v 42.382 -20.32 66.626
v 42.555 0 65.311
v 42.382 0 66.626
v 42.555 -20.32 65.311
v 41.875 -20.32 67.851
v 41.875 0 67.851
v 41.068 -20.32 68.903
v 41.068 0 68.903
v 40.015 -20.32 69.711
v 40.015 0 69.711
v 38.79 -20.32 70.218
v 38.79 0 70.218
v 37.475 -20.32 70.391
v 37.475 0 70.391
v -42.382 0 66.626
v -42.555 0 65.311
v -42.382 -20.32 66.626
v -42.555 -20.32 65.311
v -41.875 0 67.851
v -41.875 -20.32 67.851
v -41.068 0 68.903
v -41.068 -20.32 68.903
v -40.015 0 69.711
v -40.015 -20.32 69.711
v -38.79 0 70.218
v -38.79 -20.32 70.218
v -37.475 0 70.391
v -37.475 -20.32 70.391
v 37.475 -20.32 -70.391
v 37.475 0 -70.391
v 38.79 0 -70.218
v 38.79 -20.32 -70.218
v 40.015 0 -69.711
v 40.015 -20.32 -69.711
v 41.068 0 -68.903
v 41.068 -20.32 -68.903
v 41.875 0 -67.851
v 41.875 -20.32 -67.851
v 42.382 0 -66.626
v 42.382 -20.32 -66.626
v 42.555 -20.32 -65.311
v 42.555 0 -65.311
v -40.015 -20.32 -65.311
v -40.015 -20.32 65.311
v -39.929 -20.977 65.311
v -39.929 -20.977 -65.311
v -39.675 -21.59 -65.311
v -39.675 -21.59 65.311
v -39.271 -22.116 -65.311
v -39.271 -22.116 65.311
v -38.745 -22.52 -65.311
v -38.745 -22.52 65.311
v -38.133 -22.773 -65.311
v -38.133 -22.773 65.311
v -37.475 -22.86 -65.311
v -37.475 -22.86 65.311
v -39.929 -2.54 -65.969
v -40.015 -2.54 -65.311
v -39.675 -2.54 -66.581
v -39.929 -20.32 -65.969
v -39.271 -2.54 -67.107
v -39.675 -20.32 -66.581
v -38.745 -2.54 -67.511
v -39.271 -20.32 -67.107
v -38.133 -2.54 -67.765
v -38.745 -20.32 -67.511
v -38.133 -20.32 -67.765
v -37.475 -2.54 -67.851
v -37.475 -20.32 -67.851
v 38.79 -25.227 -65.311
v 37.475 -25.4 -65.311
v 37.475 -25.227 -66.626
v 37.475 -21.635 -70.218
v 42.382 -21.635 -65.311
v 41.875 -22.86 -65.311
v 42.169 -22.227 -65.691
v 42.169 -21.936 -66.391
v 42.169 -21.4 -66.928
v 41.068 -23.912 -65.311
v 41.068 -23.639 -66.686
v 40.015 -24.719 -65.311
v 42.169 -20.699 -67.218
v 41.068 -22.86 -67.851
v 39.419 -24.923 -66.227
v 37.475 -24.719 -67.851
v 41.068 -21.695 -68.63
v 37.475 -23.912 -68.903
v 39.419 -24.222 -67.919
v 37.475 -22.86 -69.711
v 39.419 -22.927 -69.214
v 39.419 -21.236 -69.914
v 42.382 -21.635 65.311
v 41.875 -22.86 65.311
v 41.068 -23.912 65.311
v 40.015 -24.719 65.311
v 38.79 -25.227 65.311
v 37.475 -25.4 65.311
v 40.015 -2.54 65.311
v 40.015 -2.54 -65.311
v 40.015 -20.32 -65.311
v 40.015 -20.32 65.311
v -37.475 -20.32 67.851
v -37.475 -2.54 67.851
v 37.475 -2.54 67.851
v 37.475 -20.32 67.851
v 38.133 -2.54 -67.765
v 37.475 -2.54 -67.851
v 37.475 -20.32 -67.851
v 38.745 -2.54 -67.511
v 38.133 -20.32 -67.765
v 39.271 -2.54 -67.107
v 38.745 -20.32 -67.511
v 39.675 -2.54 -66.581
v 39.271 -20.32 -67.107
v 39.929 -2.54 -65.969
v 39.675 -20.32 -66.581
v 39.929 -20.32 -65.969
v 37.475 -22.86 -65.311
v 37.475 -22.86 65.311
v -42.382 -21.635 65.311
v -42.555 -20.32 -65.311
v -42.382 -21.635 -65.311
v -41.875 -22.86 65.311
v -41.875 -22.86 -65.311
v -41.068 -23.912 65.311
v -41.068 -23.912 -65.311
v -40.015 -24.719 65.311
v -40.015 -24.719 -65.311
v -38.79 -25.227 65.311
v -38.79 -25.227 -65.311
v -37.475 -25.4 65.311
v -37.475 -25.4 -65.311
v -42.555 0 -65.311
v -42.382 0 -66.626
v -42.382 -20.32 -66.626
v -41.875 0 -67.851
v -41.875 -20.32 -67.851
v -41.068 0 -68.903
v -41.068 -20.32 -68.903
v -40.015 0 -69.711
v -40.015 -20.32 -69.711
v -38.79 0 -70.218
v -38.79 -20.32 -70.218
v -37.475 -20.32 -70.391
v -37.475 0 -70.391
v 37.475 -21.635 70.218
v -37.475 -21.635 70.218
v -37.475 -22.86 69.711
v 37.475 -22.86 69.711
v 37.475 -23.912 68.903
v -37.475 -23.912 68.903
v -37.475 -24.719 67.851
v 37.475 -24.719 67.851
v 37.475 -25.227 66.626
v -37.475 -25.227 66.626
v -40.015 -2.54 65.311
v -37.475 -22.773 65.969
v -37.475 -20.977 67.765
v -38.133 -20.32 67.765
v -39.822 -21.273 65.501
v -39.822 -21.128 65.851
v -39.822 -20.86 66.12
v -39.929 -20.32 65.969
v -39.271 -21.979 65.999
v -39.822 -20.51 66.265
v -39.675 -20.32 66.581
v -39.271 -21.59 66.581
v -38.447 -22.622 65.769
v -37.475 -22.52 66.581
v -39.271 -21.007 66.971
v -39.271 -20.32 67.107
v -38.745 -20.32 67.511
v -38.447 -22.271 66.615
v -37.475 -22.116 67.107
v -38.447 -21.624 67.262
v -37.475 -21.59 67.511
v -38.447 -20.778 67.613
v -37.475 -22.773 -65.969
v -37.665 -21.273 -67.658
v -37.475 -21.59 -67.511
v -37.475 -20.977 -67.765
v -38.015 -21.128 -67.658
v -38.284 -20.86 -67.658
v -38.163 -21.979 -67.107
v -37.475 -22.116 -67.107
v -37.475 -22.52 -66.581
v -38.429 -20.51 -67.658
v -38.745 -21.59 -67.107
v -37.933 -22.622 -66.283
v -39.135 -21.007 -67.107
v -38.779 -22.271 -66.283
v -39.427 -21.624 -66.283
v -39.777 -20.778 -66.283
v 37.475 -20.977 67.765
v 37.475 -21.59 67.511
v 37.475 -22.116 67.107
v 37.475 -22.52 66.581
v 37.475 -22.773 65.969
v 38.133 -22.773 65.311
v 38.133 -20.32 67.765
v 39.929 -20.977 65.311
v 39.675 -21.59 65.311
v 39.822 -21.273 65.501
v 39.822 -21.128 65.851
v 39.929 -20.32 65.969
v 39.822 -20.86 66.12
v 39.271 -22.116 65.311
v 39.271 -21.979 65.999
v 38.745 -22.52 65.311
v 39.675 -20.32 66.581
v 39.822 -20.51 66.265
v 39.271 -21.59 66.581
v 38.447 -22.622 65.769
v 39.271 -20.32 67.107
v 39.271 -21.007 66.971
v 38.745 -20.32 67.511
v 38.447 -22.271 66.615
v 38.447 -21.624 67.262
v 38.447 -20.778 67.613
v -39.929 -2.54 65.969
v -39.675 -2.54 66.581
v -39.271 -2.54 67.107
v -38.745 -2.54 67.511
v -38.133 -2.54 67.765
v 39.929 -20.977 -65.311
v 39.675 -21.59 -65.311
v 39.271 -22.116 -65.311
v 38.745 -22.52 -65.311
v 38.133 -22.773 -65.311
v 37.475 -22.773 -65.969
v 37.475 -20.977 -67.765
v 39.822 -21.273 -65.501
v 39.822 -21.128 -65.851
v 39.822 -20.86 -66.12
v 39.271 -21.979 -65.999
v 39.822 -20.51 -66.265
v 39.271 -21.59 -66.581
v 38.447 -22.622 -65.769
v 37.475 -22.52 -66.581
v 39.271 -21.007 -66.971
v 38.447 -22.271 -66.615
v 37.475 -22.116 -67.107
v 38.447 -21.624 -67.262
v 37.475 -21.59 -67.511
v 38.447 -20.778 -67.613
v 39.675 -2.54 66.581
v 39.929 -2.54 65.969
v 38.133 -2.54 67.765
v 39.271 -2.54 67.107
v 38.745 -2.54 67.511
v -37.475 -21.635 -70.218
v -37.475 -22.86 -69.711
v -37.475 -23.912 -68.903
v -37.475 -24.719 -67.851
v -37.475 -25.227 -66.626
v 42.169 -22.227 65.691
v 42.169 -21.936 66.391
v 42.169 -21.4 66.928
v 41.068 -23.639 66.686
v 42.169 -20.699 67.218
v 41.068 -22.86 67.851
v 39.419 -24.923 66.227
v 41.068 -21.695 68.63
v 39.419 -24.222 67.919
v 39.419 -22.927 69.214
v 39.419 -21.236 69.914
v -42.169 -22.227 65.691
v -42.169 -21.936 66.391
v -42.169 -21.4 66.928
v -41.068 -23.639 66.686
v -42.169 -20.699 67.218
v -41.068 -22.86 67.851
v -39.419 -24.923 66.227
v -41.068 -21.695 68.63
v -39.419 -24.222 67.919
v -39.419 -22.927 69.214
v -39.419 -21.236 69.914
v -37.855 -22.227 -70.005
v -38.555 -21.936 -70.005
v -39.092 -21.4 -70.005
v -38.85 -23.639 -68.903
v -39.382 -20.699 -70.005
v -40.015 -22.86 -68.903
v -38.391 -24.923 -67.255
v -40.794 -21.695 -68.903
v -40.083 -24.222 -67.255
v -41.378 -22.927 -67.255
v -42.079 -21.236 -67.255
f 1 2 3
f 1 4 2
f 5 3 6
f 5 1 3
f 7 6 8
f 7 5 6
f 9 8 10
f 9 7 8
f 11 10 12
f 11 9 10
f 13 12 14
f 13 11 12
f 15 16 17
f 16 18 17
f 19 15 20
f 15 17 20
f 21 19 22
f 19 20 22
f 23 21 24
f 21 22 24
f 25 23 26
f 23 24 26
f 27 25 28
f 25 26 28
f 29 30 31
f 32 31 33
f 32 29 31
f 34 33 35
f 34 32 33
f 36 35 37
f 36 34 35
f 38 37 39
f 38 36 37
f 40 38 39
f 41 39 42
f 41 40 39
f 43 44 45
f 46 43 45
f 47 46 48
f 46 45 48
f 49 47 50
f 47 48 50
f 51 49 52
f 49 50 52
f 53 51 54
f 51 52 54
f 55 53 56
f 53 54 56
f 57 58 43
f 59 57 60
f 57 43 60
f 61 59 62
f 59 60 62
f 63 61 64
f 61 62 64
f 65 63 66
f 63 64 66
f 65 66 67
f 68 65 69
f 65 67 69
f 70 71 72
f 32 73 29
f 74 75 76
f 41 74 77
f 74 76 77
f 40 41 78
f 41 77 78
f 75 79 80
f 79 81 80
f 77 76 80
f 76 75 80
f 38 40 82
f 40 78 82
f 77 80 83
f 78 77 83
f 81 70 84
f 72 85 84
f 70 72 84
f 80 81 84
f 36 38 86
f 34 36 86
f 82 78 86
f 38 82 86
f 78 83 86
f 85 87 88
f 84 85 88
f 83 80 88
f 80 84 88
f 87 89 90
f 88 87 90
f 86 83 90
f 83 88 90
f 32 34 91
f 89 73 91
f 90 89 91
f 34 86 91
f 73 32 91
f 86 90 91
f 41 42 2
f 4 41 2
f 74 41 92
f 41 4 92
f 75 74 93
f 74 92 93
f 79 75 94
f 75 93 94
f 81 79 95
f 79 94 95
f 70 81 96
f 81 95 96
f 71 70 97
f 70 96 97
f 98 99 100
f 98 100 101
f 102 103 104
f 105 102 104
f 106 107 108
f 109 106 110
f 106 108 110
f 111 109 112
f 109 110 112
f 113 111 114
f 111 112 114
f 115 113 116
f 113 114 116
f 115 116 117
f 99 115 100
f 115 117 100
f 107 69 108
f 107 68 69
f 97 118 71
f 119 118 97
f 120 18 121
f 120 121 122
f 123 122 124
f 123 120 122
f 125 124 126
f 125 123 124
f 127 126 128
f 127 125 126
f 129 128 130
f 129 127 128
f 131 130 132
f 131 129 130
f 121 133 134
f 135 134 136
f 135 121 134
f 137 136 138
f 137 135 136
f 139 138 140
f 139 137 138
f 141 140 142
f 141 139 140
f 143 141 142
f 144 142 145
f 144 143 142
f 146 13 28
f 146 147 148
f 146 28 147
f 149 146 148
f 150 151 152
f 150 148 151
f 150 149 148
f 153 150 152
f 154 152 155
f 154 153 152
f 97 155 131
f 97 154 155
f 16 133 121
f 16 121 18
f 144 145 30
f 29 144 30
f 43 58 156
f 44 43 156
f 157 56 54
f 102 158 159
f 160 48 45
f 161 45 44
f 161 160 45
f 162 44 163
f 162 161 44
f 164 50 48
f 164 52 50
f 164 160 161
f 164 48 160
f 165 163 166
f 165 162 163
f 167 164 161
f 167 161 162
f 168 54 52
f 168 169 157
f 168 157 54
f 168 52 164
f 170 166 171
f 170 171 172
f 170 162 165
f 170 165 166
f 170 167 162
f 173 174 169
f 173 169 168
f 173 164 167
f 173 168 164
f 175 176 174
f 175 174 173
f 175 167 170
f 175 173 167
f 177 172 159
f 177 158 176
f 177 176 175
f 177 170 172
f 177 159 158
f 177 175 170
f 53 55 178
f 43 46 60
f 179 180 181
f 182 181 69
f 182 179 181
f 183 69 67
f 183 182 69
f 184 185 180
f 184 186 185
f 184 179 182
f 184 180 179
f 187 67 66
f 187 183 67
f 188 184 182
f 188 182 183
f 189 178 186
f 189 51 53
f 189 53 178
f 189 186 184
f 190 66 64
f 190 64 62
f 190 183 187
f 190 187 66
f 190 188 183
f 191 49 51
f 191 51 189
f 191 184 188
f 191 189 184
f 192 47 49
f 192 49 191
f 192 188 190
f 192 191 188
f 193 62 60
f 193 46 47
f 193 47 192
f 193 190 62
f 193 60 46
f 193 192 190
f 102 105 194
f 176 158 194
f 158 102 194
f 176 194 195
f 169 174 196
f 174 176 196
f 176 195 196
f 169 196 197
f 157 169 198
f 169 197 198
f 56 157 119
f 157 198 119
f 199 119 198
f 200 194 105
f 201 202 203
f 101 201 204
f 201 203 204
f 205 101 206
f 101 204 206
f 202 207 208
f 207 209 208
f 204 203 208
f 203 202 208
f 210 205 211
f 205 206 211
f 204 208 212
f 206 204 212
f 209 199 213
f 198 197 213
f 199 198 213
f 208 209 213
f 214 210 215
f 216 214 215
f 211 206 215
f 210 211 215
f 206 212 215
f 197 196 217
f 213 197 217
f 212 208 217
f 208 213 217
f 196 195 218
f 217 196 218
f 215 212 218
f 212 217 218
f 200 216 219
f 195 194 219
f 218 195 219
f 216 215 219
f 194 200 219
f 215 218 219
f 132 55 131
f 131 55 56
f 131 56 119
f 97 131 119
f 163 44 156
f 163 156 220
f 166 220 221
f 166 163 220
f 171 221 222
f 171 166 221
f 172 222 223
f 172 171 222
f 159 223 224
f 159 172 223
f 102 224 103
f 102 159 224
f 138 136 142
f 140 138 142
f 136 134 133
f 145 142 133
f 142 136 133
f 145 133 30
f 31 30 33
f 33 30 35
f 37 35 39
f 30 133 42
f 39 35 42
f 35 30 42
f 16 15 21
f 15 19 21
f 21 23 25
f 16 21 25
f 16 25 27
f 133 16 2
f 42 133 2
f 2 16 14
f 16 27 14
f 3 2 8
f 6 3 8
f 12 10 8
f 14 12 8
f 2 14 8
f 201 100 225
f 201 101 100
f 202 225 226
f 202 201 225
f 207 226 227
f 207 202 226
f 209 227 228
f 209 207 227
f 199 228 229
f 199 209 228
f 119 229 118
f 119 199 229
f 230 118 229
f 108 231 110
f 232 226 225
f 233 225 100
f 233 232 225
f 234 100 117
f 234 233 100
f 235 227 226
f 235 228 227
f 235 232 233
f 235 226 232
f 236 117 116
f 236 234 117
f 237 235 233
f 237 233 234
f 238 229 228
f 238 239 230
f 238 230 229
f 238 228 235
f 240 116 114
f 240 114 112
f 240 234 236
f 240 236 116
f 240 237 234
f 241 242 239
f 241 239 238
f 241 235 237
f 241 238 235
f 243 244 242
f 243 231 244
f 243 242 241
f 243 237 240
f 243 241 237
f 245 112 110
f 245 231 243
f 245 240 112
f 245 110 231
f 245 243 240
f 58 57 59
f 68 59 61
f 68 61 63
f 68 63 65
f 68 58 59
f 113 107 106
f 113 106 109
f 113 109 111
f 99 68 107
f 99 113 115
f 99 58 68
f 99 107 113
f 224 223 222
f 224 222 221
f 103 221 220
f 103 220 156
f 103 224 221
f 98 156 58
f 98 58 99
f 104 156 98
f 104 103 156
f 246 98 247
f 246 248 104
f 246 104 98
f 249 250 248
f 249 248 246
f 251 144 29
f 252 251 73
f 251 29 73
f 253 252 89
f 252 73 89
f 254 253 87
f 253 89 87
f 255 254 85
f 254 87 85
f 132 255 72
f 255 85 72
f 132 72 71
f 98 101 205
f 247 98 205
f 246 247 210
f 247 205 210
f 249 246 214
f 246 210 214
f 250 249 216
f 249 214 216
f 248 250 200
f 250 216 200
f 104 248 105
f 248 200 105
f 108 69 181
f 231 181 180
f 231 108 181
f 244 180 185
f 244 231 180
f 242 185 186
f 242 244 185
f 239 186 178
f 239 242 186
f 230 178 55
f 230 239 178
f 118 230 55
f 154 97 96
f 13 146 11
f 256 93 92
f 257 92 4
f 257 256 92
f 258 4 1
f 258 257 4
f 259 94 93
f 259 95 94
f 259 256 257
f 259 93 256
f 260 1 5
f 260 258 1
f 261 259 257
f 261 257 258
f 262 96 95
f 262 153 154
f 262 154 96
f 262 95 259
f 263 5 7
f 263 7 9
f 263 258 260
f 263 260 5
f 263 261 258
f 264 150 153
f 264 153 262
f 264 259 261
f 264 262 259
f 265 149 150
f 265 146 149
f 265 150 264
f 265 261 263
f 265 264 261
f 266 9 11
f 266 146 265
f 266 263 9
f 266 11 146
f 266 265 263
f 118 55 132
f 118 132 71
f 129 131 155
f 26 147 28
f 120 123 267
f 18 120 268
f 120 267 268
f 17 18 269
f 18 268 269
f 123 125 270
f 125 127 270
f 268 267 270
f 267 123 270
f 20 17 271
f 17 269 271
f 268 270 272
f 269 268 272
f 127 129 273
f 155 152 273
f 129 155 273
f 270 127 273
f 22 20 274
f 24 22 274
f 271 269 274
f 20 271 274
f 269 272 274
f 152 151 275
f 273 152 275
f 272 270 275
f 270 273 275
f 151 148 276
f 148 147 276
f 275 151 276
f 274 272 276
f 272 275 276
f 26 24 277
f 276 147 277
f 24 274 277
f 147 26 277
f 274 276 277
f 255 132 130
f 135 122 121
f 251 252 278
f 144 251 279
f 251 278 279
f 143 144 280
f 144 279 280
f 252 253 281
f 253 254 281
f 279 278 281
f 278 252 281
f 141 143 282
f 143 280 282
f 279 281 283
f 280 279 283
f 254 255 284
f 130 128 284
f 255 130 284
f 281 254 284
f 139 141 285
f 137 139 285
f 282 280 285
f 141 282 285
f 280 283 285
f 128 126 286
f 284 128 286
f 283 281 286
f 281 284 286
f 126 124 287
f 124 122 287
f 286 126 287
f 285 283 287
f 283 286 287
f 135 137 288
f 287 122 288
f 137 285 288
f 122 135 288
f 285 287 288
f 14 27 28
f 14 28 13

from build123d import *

# Parameters (mm, degrees)
F0_W     = 85.1108208299
F0_H     = 140.7826244831
F1_DEPTH = 25.4
F2_R     = 5.08
F3_T     = -2.54


# Not quite as in the source:
# - a shell that OpenCascade refuses in one call is made with other operations: the cavity is built on its own and cut out


with BuildPart() as f1:
    # F0 (on Front) → F1 (new body)
    with BuildSketch(Plane.XZ):
        Rectangle(F0_W, F0_H)
    extrude(amount=F1_DEPTH)

    # F2
    f2_edges = [f1.edges().sort_by_distance(p)[0] for p in [
        (0, -25.4, 70.391312),
        (-42.55541, -25.4, 0),
        (0, -25.4, -70.391312),
        (42.55541, -25.4, 0),
        (-42.55541, -12.7, 70.391312),
        (42.55541, -12.7, 70.391312),
        (-42.55541, -12.7, -70.391312),
        (42.55541, -12.7, -70.391312),
    ]]
    fillet(f2_edges, radius=F2_R)

    # F3: a shell. OpenCascade refuses it in one call, so the cavity is built on its own and cut out:
    # the body offset inwards by the wall thickness, plus a prism from it out through each open face.
    f3_core = offset(f1.part, amount=F3_T, mode=Mode.PRIVATE)
    f3_exits = [f3_core.faces().sort_by_distance(p)[0] for p in [
        (0, -22.86, 0),
    ]]
    add(f3_core, mode=Mode.SUBTRACT)
    extrude(f3_exits, amount=-F3_T, mode=Mode.SUBTRACT)


solid = f1.part
